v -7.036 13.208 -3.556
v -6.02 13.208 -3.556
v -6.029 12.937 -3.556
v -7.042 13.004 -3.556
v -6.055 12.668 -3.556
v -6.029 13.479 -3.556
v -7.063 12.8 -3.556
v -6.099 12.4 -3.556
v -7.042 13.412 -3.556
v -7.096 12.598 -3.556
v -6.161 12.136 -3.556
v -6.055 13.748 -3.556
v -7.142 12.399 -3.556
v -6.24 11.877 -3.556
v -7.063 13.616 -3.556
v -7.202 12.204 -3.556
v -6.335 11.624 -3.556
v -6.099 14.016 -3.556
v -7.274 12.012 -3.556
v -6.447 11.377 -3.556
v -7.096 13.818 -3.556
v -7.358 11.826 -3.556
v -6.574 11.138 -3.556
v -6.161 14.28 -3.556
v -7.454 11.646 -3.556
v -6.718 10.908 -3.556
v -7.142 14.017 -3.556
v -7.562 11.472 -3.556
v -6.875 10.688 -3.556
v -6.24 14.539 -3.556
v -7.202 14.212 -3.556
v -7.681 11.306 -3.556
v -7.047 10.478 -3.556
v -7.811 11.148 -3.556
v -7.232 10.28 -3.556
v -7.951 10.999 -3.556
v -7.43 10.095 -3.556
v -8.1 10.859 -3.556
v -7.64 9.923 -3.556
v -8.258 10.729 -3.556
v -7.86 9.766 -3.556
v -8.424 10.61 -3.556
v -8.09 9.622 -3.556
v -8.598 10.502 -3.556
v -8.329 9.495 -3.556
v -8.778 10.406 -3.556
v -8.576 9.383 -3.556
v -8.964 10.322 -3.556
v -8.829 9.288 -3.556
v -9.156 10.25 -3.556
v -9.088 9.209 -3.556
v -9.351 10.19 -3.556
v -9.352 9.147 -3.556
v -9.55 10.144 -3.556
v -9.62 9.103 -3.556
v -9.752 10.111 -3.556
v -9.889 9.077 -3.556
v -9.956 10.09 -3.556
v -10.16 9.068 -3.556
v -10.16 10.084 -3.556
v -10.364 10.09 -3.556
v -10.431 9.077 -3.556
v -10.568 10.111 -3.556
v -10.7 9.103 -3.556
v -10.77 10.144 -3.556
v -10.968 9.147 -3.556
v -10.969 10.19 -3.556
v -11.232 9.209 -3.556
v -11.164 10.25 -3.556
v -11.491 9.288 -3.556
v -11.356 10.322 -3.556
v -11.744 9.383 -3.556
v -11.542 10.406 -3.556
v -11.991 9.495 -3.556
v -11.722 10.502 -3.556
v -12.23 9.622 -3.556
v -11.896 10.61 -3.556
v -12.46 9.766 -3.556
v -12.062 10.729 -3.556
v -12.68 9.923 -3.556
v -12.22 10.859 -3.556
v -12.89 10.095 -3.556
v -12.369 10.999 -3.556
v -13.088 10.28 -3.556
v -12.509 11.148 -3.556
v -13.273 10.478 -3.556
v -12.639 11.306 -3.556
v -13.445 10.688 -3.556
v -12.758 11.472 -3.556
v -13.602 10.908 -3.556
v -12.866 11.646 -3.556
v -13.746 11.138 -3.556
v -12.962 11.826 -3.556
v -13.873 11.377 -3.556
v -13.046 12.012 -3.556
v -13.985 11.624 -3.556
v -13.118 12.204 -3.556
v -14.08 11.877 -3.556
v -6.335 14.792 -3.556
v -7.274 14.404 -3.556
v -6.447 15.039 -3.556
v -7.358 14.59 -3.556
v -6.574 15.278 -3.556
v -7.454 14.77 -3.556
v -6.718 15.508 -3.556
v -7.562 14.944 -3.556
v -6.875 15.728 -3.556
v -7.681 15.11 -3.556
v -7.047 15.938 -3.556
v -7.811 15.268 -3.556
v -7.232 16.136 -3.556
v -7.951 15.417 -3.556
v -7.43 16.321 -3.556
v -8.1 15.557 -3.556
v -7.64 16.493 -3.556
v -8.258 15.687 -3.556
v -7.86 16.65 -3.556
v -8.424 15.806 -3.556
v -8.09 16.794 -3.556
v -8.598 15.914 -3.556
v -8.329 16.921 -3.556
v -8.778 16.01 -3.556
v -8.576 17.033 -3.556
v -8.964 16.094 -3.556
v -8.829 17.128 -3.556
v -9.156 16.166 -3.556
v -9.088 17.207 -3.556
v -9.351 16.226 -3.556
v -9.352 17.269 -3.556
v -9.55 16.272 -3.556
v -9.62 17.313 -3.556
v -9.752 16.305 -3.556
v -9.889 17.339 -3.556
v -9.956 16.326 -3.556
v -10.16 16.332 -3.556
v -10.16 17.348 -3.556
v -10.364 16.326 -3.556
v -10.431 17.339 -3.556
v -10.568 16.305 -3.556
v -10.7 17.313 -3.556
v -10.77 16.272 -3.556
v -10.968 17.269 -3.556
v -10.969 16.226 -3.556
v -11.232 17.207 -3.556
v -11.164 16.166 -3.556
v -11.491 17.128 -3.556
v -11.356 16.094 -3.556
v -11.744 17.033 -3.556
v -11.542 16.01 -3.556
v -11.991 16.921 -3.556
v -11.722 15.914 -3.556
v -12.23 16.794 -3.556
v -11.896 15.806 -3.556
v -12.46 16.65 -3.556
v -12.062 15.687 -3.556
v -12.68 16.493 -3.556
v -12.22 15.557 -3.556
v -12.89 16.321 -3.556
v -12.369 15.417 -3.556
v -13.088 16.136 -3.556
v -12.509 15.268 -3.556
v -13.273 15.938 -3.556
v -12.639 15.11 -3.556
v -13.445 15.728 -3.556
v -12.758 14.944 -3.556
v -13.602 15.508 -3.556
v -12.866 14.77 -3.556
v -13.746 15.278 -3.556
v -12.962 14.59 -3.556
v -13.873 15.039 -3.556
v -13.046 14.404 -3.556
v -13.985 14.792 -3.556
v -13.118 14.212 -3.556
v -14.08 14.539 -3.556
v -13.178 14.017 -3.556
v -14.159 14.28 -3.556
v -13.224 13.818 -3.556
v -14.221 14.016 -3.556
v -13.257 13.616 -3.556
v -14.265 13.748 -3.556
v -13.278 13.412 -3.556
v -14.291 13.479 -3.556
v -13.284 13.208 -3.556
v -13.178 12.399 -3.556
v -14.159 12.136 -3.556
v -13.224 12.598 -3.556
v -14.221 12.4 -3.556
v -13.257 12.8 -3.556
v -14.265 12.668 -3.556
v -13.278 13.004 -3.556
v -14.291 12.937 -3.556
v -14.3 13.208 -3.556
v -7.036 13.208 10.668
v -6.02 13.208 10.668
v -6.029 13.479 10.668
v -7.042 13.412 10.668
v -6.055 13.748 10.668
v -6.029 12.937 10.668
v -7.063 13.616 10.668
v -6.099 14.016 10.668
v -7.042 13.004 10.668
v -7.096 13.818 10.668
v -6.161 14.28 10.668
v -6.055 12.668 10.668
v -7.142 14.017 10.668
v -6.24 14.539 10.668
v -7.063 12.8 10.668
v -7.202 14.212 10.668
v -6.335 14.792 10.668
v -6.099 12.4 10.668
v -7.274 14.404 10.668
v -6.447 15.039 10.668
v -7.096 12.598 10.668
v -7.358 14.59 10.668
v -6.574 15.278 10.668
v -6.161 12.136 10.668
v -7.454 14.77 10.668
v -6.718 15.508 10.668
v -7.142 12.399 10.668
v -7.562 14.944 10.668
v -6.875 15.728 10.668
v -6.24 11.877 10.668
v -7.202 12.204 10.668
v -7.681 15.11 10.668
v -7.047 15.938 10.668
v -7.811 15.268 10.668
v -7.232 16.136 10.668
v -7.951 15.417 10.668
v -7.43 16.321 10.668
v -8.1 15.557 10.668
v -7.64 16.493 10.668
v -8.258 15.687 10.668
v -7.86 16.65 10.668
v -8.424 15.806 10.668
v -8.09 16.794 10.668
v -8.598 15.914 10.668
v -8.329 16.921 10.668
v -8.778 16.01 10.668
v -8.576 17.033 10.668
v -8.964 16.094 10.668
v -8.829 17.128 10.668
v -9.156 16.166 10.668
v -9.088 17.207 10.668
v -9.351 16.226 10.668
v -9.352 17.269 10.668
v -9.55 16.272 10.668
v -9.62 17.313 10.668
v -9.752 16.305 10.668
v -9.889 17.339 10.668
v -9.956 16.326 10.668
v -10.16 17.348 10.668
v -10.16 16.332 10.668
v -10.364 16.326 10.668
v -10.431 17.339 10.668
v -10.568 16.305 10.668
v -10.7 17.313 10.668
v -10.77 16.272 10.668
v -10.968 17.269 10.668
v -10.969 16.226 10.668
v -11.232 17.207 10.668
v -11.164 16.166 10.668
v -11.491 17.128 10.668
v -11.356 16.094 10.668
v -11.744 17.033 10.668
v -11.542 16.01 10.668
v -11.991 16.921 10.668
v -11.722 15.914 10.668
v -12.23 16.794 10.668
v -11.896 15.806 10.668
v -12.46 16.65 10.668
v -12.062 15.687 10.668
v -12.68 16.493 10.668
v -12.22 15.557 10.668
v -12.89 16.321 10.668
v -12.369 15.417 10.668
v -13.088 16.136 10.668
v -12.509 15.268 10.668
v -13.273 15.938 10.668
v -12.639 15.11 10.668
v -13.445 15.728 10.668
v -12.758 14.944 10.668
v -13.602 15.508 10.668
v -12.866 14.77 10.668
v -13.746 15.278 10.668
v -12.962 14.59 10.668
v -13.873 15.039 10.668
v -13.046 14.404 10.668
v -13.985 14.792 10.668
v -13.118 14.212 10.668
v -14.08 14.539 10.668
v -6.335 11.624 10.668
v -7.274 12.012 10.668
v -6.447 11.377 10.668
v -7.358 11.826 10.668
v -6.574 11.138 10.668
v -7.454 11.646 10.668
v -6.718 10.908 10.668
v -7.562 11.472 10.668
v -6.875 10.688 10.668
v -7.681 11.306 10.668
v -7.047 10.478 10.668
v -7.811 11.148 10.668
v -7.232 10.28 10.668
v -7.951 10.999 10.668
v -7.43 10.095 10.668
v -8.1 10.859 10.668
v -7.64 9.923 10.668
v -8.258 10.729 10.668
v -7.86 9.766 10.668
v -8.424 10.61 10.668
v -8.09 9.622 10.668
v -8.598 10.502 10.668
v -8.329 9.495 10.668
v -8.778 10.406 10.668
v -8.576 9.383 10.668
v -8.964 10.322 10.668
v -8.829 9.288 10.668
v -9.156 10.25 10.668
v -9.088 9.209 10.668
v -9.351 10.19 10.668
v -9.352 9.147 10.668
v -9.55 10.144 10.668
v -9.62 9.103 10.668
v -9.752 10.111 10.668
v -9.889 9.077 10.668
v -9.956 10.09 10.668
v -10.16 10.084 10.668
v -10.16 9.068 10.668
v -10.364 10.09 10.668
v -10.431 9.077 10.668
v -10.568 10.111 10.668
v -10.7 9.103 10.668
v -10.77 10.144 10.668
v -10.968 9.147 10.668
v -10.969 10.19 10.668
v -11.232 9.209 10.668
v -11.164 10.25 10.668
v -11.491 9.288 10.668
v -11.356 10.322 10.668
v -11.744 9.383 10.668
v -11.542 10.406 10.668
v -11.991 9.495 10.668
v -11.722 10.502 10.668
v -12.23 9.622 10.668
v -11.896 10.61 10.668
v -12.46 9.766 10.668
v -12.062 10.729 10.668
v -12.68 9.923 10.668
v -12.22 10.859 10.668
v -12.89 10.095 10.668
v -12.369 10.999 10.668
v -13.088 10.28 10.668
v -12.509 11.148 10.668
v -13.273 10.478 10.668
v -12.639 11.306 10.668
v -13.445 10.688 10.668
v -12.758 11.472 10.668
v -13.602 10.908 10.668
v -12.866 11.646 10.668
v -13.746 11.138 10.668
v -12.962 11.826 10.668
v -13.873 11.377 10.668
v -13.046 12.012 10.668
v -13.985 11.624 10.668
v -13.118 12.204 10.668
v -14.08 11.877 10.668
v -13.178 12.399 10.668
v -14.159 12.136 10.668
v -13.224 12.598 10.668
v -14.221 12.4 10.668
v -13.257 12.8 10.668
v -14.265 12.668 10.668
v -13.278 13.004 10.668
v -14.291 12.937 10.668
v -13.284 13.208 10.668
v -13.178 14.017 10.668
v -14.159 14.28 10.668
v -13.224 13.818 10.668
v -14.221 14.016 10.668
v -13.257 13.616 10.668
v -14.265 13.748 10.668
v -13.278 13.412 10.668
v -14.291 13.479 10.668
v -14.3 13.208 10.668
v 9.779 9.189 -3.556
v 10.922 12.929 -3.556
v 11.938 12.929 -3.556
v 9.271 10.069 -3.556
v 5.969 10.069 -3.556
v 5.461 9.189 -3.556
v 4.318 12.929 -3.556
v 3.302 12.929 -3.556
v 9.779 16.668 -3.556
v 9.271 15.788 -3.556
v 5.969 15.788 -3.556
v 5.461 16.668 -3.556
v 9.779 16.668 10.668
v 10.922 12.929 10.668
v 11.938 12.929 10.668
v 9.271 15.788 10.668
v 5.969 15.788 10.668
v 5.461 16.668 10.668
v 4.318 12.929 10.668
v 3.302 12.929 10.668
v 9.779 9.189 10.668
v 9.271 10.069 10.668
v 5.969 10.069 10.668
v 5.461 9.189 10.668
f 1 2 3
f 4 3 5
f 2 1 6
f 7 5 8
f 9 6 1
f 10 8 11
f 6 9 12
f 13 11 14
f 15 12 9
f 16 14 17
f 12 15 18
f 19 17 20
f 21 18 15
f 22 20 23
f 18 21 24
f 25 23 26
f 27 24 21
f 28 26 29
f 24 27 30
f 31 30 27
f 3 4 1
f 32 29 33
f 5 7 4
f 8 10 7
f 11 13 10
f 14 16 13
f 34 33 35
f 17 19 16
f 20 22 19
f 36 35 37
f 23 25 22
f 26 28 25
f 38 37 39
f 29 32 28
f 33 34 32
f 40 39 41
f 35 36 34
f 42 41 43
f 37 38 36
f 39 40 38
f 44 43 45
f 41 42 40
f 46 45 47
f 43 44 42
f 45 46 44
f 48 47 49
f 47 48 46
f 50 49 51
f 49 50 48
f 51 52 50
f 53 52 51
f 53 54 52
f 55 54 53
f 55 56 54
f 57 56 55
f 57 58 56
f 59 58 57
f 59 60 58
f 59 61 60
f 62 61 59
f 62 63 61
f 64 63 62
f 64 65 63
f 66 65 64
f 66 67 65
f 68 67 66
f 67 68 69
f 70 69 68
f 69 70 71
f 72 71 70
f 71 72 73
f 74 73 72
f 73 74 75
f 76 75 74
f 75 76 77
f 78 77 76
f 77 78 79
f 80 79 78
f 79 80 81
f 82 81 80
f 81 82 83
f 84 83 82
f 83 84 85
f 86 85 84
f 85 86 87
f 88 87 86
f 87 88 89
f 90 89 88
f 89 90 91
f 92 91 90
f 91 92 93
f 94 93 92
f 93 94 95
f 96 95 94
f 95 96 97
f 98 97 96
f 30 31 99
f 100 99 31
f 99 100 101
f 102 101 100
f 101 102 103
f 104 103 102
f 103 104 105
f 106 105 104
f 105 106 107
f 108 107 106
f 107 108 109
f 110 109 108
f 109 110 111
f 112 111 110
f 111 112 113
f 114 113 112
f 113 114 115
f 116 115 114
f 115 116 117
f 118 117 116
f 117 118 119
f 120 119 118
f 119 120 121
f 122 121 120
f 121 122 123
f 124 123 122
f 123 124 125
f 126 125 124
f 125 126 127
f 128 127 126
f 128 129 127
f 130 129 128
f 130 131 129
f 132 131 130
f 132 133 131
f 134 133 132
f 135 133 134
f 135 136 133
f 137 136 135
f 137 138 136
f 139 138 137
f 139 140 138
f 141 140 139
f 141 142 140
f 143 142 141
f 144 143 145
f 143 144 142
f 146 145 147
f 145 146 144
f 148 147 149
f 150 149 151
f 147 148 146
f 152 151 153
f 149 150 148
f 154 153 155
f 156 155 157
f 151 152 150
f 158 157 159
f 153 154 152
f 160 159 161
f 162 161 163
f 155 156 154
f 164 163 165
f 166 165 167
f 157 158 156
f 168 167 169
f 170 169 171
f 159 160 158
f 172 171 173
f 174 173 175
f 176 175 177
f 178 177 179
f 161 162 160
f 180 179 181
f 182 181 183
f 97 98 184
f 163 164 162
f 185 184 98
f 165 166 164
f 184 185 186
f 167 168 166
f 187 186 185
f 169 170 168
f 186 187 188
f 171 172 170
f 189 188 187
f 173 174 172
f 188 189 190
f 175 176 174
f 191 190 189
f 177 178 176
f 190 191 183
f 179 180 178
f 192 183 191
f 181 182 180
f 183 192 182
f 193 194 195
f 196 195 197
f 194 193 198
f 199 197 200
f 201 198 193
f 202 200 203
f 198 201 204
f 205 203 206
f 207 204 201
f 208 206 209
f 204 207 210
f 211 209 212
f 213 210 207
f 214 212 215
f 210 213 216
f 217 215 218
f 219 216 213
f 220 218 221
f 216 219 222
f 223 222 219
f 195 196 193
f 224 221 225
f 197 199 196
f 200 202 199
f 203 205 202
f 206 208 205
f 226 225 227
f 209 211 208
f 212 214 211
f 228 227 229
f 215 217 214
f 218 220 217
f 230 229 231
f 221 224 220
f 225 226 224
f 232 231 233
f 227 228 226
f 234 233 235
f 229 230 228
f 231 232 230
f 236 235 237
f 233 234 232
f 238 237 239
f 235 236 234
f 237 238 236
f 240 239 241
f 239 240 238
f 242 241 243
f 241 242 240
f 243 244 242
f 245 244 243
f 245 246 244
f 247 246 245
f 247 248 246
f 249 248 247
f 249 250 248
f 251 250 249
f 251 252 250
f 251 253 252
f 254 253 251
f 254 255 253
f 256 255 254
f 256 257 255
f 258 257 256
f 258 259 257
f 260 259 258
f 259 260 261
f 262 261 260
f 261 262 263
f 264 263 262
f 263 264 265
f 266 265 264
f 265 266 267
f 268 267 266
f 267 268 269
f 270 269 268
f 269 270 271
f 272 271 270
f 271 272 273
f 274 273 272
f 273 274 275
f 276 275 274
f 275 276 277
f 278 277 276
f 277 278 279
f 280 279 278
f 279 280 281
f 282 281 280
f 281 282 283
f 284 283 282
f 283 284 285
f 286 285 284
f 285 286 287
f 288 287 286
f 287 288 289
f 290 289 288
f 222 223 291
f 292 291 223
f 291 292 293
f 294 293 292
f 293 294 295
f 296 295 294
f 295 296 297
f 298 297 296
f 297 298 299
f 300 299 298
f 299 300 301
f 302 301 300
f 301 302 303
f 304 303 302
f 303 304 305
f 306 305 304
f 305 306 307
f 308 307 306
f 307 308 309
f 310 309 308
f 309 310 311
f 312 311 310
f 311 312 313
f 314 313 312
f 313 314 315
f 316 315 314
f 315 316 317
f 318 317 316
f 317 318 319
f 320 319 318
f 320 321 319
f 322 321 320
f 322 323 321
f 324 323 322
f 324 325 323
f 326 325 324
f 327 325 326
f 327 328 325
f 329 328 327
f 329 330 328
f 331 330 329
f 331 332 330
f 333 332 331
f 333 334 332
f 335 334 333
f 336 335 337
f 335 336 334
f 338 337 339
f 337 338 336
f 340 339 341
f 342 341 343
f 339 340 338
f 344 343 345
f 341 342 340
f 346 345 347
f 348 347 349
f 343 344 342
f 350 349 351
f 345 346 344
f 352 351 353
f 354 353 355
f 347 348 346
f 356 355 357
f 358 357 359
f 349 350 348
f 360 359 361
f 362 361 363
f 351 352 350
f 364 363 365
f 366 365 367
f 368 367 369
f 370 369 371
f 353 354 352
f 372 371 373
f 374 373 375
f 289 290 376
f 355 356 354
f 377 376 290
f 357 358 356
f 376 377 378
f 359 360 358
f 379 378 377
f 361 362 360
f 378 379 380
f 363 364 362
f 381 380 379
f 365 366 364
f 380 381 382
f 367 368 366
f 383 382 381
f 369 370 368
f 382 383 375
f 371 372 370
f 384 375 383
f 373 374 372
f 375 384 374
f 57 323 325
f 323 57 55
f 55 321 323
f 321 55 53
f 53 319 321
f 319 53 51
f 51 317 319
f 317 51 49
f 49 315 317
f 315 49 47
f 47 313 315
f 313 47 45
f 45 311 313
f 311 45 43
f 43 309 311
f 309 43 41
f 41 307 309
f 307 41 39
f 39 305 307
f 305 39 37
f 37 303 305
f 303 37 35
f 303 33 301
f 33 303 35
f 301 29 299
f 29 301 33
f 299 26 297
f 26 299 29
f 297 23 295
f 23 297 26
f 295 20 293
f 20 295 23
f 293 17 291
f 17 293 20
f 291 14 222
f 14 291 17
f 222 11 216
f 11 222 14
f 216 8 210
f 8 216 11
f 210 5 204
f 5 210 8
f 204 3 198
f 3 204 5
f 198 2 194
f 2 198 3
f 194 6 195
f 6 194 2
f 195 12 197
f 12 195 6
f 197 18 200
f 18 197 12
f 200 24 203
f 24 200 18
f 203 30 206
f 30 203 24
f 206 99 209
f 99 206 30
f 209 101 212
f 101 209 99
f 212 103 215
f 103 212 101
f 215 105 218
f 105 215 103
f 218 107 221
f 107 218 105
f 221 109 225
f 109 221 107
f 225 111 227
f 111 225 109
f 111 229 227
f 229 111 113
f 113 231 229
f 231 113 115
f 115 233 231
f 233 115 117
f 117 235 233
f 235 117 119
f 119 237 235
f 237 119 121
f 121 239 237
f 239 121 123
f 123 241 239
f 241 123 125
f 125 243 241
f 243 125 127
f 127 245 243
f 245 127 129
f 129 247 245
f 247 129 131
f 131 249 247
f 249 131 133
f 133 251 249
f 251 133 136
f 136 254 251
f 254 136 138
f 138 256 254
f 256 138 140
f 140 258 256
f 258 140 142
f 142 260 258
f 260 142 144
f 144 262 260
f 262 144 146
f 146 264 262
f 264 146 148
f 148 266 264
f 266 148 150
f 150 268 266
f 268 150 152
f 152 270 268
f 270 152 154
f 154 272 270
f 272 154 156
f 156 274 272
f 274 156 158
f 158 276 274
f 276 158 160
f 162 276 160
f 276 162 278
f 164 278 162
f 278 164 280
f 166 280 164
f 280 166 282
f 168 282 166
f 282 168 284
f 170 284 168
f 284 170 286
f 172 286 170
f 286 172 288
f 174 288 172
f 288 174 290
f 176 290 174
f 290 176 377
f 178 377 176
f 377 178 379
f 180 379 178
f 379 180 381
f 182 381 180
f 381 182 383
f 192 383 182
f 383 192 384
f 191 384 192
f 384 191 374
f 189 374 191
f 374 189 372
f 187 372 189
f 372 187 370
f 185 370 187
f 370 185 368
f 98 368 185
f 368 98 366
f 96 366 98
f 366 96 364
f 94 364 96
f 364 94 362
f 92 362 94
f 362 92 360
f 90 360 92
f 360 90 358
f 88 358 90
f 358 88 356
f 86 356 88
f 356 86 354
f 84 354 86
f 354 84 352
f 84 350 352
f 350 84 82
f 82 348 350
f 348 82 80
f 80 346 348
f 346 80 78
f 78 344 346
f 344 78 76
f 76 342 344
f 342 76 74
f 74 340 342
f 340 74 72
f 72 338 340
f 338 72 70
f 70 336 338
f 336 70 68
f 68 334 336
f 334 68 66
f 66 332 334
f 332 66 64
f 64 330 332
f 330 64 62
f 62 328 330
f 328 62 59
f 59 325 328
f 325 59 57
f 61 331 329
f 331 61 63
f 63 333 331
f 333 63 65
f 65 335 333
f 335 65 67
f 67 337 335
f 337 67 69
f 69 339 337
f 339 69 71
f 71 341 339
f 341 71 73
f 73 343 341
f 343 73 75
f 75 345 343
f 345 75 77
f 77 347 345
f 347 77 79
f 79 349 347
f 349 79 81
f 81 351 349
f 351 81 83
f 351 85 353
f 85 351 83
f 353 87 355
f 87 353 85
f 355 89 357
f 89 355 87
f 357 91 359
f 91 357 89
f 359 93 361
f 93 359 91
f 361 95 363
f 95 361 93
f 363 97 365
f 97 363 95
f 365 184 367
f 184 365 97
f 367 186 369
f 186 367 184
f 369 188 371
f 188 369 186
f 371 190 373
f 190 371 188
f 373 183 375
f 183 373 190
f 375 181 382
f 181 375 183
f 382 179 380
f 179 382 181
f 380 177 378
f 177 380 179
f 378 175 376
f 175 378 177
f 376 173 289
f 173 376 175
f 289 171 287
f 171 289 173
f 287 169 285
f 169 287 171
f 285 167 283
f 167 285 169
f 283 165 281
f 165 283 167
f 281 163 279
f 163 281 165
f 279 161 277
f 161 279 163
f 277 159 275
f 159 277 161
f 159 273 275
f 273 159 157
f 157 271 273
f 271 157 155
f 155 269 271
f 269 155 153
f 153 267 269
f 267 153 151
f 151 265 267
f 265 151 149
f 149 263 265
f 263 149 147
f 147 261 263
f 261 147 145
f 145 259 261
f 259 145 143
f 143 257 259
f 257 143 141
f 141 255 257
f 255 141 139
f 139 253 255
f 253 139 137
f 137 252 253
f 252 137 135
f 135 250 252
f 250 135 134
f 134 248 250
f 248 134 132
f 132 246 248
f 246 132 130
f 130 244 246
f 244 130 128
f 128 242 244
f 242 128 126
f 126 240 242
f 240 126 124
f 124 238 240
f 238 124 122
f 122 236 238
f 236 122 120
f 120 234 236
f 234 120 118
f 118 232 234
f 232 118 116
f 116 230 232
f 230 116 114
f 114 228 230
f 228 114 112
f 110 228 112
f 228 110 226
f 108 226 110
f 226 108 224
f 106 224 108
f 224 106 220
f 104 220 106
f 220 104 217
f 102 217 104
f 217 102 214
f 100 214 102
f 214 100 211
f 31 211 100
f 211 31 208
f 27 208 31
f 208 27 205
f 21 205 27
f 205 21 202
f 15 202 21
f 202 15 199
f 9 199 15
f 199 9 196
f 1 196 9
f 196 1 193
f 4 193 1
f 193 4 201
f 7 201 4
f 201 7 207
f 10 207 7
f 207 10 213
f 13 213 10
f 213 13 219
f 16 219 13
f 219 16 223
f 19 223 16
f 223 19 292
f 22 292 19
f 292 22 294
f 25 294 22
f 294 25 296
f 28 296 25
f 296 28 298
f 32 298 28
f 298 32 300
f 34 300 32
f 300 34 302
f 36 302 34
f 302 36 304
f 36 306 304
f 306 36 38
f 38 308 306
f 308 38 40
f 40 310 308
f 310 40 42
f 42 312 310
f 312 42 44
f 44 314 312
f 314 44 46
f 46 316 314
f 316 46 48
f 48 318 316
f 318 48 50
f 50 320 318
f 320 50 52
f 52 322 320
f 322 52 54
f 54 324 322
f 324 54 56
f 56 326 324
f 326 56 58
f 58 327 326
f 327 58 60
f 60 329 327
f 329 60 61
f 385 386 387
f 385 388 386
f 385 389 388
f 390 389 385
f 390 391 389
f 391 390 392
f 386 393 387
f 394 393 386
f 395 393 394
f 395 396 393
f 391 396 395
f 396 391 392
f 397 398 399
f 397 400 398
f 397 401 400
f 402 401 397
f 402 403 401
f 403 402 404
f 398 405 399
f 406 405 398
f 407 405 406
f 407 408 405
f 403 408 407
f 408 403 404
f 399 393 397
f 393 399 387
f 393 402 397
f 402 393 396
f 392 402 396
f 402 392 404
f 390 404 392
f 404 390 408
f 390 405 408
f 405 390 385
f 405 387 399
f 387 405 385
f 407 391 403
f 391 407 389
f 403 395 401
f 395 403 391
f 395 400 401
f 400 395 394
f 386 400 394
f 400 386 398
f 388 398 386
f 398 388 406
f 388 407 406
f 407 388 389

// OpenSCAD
ViewScale = [0.0254, 0.0254, 0.0254];

PLATELIFT=140;
RINGTHICKNESS=80;

scale(ViewScale)
{
    // pen support
    translate([-400, 520, -PLATELIFT])
    linear_extrude(PLATELIFT*4)
    difference() {
        circle(346/2-10, $fn=96);
        circle(246/2, $fn=96);
    }
    // pencil support
    translate([300, 509, -PLATELIFT])
    linear_extrude(PLATELIFT*4)
    difference() {
        circle(360/2-10, $fn=6);
        circle(260/2, $fn=6);
    }
}
